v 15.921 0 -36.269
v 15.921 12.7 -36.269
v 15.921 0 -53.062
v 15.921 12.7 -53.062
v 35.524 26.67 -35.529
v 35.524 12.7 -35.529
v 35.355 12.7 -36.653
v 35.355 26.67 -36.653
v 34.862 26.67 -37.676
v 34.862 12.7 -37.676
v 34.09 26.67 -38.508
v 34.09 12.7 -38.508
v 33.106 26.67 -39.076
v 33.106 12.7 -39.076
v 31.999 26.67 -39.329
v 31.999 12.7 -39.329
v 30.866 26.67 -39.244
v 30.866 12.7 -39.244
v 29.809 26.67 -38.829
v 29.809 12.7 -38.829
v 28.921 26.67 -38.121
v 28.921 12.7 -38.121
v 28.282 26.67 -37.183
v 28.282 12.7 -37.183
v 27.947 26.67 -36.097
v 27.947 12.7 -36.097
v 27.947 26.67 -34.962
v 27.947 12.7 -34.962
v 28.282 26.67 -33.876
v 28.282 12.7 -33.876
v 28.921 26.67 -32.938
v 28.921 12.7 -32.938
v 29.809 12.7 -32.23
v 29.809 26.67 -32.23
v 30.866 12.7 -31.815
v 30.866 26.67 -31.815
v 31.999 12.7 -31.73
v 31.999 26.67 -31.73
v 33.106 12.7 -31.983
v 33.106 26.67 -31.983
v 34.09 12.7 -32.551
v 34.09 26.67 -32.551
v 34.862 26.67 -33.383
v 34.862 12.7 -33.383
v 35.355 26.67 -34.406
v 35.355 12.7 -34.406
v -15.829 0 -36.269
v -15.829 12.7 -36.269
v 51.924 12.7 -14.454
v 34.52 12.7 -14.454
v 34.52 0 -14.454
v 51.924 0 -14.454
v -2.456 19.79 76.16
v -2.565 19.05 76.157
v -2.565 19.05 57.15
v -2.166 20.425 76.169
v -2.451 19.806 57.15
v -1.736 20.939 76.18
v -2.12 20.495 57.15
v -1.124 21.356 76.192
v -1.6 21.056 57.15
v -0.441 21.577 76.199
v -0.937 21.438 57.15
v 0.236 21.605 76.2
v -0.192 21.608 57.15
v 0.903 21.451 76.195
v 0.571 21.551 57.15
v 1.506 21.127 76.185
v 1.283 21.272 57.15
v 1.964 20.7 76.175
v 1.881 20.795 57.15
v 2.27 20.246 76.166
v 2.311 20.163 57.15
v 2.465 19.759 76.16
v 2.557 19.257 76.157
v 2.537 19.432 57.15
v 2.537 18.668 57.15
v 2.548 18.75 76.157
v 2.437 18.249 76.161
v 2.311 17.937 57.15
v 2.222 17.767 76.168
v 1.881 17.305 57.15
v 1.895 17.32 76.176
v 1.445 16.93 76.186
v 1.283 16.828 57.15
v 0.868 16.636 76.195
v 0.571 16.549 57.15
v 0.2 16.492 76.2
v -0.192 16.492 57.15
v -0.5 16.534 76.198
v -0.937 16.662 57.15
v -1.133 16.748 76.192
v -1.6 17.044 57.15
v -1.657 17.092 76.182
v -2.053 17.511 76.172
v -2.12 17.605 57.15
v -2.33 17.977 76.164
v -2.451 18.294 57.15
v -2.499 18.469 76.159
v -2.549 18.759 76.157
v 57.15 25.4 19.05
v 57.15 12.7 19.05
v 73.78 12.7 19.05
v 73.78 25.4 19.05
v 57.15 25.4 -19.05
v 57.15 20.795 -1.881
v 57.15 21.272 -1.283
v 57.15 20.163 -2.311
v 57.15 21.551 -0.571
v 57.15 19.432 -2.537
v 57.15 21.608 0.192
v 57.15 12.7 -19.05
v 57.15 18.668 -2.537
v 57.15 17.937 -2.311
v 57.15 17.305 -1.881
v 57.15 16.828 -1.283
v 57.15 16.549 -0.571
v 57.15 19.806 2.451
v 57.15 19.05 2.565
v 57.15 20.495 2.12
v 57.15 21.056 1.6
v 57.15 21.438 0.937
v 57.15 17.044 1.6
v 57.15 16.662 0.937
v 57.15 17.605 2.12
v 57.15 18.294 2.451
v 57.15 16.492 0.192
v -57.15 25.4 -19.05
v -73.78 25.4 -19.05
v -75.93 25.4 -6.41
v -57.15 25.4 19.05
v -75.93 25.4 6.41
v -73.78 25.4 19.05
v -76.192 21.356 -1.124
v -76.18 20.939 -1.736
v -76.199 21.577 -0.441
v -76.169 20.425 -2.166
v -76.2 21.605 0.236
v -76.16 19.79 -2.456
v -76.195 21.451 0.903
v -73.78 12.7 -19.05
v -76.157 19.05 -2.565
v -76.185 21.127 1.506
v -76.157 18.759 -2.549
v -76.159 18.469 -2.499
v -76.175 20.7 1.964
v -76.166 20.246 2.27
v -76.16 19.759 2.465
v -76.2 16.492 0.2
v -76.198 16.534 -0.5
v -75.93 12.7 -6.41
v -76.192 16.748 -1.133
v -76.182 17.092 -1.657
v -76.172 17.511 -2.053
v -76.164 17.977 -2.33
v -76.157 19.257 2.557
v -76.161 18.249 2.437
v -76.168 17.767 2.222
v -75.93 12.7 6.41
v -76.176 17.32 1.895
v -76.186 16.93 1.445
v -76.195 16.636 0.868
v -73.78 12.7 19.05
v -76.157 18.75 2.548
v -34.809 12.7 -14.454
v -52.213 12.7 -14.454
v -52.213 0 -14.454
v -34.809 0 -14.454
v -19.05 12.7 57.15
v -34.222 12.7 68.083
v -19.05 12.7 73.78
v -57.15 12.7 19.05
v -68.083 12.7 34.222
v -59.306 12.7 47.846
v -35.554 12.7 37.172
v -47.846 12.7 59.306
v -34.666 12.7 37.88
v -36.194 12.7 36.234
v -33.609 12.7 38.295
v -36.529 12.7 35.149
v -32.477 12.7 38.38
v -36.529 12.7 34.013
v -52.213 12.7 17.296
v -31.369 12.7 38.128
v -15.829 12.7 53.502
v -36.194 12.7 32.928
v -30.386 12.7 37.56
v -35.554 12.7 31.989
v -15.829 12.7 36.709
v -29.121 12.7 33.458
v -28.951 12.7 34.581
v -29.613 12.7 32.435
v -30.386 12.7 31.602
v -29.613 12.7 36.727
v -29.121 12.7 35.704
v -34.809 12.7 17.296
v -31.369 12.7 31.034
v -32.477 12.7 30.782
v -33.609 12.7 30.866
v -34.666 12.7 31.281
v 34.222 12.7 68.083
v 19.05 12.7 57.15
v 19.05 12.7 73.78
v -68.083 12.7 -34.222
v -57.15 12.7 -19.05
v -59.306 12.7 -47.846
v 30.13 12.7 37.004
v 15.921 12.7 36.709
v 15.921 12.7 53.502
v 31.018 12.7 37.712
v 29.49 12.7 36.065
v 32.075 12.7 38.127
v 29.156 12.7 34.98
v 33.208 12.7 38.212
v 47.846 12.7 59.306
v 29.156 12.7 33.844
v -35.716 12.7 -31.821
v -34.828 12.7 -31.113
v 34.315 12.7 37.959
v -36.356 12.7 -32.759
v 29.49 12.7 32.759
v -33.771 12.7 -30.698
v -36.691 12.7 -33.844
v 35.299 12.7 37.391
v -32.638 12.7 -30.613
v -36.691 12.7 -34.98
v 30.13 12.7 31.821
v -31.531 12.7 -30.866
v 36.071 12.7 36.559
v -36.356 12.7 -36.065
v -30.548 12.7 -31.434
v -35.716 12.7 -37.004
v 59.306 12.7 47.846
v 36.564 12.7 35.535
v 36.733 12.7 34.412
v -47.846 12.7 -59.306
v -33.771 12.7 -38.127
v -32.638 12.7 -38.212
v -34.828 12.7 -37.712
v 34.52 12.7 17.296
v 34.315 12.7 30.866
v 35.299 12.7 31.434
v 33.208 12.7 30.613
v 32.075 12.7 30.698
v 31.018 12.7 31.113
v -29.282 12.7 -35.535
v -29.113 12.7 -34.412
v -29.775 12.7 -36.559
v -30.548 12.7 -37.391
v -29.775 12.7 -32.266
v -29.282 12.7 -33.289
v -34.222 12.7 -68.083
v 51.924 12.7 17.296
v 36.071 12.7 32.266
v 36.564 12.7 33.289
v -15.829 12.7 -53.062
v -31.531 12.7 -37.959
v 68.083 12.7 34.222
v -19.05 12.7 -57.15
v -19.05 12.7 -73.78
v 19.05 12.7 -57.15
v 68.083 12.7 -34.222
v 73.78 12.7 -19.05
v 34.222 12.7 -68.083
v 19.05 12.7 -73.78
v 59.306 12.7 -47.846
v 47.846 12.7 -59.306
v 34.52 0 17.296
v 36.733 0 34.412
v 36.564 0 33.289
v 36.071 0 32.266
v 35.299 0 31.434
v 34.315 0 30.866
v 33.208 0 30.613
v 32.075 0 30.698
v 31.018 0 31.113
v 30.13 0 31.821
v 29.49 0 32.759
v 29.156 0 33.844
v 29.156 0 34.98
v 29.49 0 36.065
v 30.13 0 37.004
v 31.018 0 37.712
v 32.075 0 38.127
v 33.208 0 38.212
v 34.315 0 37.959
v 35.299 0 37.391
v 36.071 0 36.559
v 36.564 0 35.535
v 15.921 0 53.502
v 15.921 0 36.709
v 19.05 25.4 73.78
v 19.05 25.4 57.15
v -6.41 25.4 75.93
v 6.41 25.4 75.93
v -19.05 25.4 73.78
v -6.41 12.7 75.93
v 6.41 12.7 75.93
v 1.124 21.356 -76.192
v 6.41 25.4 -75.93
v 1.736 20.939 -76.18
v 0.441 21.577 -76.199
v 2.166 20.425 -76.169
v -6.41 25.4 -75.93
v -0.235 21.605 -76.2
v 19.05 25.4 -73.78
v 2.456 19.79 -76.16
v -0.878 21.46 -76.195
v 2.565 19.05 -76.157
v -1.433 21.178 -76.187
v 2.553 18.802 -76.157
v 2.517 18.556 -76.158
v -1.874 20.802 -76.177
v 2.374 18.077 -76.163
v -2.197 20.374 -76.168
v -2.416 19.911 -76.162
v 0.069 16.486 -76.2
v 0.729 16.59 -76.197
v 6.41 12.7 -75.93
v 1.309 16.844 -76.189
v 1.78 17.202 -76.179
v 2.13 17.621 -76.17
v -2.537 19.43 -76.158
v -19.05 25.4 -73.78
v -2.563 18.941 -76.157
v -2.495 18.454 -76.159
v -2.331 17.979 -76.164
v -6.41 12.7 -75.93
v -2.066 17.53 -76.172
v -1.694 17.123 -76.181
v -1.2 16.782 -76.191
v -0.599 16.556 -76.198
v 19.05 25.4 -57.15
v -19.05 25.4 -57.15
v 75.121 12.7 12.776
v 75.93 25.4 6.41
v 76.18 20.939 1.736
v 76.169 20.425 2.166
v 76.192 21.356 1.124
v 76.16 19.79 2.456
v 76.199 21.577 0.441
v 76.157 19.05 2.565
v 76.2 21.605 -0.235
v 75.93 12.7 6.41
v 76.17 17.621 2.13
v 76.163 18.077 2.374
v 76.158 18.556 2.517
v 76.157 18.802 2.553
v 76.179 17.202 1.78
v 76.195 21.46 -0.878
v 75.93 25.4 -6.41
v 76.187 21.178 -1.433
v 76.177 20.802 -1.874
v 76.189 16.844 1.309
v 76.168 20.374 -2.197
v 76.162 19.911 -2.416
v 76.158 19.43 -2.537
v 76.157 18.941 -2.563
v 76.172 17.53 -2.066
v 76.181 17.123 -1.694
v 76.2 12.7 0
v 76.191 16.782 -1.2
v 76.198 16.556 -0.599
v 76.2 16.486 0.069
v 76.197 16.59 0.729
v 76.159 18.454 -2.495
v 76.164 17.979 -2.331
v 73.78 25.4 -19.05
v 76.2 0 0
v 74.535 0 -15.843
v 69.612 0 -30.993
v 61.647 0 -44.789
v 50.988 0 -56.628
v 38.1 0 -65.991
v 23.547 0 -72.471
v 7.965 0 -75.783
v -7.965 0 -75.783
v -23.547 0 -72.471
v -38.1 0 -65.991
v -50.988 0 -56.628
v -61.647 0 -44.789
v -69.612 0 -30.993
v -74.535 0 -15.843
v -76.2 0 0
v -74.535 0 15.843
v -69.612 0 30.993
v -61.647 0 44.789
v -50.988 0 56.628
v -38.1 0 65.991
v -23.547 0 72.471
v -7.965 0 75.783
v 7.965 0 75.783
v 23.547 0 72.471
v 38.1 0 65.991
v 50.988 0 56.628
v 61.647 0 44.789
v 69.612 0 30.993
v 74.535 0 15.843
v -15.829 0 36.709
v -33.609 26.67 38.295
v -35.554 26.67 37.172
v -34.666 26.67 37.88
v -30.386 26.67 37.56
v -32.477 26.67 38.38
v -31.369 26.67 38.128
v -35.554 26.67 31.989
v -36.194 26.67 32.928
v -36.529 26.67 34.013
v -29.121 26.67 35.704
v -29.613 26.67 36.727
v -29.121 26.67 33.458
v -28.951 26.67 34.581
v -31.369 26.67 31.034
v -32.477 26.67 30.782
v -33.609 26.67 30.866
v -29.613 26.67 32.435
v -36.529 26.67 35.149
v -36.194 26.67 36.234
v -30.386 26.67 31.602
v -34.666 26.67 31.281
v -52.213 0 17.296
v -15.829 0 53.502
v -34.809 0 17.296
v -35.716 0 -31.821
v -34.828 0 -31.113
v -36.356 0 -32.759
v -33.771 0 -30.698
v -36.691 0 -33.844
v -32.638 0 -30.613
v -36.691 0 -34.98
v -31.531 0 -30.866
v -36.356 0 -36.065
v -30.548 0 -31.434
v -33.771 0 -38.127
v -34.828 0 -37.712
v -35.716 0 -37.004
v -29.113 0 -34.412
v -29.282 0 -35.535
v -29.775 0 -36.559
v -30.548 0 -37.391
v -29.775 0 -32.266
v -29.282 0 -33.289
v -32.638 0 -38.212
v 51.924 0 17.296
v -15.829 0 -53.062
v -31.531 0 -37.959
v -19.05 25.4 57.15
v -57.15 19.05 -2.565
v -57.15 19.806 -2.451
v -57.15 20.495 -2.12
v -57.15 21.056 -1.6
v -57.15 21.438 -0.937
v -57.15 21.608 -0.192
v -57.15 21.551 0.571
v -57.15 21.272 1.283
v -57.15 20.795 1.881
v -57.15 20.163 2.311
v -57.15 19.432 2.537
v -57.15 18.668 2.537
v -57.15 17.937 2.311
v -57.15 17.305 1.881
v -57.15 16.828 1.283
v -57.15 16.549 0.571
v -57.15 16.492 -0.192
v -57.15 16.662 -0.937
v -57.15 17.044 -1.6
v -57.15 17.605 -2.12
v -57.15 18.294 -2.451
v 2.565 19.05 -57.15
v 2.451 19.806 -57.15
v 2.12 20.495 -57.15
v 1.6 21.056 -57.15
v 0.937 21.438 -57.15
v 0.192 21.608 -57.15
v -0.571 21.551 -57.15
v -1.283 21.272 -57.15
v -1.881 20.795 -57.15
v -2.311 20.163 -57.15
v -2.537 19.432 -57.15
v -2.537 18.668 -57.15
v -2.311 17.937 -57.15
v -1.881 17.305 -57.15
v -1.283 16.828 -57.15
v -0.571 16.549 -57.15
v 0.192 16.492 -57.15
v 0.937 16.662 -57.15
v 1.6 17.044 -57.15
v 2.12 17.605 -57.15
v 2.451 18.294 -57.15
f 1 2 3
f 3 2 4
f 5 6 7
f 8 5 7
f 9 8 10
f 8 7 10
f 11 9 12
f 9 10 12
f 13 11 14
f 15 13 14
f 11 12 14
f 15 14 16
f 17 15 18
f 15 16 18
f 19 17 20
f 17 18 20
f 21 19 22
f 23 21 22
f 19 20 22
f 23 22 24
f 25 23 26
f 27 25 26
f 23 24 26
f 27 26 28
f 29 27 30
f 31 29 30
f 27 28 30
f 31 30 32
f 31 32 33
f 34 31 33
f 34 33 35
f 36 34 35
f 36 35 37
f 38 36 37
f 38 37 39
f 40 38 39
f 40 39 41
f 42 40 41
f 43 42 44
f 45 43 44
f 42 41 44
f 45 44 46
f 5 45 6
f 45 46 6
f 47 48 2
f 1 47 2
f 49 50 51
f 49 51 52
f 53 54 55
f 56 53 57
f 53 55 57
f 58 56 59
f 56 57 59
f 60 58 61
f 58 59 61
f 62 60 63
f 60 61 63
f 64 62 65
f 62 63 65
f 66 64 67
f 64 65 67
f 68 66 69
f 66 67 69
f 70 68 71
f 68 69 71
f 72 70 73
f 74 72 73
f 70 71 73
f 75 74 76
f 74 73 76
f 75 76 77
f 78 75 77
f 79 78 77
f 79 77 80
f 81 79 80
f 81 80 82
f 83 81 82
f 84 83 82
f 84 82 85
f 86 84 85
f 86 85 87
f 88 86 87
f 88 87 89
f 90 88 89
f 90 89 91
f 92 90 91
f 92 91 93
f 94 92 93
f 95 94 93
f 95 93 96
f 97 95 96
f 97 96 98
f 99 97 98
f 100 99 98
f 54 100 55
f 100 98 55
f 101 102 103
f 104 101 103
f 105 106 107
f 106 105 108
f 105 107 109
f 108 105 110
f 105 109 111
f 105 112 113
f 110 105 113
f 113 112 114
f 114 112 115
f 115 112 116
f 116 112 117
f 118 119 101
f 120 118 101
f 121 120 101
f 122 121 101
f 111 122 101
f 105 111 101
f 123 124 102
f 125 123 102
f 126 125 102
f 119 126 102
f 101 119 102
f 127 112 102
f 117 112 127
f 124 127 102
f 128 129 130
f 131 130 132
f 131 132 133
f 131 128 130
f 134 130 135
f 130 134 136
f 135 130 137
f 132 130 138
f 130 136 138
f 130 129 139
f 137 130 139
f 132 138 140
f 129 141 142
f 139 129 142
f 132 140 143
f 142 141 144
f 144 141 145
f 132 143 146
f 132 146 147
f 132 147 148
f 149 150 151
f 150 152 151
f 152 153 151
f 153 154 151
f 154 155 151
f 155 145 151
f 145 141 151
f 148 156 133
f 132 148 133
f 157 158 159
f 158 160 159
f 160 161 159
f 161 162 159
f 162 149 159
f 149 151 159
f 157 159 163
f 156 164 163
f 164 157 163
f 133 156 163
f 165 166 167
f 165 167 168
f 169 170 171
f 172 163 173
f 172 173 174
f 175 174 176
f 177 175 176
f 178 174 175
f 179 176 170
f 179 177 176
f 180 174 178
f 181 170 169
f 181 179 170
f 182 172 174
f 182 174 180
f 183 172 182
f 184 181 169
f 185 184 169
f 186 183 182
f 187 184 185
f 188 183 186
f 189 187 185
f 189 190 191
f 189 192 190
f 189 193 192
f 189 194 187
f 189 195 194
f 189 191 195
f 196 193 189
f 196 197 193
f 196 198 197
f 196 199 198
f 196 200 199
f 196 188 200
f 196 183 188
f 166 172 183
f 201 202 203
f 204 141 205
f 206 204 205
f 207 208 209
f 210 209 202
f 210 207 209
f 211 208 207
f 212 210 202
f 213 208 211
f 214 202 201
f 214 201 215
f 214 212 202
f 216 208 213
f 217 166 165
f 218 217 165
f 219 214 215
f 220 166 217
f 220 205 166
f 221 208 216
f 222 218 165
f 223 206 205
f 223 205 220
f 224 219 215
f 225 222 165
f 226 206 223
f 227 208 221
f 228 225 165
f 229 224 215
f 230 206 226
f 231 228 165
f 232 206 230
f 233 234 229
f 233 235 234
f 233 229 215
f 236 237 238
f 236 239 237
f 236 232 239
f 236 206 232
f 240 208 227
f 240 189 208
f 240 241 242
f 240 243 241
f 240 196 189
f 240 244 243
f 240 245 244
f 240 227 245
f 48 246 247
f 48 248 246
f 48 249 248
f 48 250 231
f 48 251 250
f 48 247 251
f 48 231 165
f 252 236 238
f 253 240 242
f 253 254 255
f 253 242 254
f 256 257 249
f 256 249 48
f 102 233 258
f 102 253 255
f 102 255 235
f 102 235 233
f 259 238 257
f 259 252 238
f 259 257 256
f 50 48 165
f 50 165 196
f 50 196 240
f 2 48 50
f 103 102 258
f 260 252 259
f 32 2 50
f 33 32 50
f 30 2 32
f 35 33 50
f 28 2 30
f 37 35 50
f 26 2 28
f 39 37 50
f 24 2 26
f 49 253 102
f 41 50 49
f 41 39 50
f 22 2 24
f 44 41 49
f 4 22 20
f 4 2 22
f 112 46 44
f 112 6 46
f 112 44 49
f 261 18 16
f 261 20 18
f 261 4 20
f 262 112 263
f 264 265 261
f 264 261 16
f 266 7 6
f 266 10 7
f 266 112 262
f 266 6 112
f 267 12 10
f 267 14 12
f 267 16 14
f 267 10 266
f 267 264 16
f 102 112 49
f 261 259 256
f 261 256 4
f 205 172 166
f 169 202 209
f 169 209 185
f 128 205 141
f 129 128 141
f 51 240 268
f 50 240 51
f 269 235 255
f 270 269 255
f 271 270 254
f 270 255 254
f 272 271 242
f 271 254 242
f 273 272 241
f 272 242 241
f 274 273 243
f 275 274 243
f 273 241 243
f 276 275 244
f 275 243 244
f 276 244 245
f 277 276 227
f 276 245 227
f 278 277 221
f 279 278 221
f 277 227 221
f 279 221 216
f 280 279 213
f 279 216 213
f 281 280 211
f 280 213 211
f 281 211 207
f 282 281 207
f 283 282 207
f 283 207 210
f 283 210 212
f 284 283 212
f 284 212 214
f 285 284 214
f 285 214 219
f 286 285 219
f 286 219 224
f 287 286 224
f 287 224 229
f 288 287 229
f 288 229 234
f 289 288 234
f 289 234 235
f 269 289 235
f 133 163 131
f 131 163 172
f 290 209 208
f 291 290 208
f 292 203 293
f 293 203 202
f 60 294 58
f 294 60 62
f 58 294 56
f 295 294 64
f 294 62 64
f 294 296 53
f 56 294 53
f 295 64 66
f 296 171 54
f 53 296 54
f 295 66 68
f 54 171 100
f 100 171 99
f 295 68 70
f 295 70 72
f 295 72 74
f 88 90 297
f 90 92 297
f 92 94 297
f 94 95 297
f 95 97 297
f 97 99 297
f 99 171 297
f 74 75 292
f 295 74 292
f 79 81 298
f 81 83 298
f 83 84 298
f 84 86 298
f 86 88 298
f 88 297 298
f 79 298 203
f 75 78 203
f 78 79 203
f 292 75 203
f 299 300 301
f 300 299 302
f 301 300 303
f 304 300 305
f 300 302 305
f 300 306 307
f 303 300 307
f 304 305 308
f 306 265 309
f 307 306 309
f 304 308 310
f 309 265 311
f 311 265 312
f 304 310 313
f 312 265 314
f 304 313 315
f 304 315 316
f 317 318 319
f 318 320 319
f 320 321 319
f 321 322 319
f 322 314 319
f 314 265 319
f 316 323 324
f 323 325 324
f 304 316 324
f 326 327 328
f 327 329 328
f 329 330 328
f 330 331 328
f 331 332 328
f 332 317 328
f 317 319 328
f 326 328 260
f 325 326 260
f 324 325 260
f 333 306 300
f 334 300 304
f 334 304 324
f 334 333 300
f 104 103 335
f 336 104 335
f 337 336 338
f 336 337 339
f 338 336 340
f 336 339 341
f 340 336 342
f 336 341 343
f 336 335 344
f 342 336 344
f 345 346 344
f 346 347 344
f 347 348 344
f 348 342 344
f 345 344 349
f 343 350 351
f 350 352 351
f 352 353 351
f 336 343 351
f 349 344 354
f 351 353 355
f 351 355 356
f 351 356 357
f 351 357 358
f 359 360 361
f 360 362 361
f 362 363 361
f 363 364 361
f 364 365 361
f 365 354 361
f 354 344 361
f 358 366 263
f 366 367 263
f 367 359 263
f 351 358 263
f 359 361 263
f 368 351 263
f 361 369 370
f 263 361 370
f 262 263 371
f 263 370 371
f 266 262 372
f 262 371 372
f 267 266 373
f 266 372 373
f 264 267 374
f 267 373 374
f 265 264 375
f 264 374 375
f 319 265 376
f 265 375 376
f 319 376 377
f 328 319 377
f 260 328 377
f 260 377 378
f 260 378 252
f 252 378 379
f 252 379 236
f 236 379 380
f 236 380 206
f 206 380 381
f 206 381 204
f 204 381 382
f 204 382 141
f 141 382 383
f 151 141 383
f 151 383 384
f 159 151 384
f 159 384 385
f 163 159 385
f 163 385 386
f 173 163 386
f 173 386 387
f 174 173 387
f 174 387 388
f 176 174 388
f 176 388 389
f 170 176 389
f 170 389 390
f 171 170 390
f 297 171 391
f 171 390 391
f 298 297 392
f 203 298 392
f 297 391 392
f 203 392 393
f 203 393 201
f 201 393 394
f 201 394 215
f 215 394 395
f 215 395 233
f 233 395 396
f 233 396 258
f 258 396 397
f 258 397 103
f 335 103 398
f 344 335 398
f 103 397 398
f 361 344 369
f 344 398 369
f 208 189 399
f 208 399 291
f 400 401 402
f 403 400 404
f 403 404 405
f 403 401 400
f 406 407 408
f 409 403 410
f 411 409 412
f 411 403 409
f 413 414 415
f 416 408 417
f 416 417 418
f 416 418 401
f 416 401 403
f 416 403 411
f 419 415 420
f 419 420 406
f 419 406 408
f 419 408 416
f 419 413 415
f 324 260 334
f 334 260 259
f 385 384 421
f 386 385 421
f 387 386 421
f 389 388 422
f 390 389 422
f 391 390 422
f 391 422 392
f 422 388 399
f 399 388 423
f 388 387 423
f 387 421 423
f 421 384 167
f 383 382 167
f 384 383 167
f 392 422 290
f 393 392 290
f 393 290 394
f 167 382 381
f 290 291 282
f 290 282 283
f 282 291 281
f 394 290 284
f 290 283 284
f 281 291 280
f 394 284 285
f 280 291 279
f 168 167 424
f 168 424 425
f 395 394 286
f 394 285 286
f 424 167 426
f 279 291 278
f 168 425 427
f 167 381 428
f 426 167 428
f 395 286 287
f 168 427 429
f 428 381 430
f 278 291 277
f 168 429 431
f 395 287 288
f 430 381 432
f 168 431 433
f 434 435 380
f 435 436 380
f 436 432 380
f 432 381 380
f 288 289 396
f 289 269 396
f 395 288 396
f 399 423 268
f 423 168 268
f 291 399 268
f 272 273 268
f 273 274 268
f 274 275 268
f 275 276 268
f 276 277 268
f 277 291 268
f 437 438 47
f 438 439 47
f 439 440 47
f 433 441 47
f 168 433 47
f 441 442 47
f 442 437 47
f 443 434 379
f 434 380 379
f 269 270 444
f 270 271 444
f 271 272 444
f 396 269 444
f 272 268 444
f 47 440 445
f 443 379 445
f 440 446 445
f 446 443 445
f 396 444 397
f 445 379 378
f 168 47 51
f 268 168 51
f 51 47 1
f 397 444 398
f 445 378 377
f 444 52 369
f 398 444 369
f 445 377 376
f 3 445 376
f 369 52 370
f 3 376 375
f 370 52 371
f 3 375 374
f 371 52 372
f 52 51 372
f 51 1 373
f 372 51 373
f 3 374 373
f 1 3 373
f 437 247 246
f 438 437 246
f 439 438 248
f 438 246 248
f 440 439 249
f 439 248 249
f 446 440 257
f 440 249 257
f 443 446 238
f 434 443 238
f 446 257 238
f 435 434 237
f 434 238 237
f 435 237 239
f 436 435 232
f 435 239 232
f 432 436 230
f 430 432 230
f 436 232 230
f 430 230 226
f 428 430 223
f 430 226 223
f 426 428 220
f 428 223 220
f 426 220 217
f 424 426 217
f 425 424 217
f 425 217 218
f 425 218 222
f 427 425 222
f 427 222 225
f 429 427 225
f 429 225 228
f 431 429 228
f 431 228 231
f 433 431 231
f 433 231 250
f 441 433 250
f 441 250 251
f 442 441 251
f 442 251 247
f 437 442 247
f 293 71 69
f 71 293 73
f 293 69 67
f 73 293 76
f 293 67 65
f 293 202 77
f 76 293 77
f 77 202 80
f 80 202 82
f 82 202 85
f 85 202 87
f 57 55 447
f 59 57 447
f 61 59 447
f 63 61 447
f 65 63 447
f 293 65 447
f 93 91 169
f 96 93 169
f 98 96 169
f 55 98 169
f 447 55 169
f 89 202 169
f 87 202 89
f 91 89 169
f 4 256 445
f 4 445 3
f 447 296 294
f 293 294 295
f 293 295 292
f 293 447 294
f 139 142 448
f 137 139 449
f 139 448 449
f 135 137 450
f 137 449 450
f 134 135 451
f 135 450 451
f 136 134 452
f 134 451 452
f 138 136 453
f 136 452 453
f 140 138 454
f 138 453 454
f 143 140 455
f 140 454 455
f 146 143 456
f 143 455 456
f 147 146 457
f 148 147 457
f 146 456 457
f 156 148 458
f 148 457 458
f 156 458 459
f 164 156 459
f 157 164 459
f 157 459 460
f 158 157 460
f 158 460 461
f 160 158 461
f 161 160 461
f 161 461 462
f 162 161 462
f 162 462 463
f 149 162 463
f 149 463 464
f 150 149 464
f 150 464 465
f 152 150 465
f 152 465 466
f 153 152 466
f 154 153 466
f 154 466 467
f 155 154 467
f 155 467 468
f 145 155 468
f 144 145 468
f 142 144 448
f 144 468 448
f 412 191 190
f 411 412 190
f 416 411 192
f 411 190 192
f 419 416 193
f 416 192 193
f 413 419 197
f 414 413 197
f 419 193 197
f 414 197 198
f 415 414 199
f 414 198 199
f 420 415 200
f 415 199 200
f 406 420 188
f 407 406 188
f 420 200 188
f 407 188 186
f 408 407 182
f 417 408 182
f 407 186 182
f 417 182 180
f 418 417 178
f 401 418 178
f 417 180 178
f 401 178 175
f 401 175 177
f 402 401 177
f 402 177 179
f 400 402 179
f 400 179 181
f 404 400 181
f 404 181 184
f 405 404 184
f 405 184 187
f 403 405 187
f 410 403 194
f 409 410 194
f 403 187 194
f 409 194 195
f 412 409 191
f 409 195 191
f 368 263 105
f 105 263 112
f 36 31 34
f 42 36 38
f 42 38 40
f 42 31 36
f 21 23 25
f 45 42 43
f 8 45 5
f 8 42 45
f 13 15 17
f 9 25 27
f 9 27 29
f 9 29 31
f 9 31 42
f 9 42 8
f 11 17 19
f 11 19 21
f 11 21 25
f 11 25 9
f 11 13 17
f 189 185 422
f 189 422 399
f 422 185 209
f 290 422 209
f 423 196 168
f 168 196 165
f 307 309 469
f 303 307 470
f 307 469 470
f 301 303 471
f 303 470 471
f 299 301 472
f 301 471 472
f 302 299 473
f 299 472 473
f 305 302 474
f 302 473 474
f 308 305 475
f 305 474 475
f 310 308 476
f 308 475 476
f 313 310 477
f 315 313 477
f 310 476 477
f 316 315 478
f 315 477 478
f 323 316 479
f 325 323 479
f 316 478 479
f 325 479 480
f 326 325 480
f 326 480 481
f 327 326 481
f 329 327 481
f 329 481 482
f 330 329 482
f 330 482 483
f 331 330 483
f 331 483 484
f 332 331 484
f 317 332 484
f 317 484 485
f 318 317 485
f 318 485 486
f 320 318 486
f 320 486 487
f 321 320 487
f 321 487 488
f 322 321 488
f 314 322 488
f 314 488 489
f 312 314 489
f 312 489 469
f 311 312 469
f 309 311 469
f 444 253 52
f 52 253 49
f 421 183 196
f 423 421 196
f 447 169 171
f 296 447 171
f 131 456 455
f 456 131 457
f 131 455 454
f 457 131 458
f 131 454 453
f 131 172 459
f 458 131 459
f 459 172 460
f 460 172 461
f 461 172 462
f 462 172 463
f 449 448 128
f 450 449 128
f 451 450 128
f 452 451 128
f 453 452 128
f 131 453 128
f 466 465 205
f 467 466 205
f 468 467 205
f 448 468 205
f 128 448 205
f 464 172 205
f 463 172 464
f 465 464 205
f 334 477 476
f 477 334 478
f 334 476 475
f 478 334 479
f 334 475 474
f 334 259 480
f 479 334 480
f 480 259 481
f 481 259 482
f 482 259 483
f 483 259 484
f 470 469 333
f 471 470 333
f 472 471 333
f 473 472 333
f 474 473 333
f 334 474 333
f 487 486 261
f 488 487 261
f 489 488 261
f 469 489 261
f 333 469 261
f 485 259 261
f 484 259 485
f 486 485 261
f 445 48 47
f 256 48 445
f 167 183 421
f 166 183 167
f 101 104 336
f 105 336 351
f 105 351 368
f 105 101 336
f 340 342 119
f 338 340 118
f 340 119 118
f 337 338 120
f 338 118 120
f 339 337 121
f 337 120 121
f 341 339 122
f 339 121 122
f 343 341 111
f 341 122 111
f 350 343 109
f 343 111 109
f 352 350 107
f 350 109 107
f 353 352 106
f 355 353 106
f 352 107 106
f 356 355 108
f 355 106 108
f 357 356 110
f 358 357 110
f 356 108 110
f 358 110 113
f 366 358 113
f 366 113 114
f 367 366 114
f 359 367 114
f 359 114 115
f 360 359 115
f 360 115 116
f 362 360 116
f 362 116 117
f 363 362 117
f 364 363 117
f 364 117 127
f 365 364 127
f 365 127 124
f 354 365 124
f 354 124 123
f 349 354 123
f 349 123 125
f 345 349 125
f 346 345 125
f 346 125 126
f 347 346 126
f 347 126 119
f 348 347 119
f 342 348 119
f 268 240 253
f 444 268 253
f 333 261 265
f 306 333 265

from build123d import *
from build123d.topology import SkipClean

# Parameters (mm, degrees)
SKETCH1_R           = 76.2
BOSS_EXTRUDE1_DEPTH = 12.7
SKETCH9_W           = 17.40446846
SKETCH9_H           = 31.75
SKETCH9_W_2         = 17.404468459
SKETCH9_W_3         = 31.75
SKETCH9_H_2         = 16.793136505
CUT_EXTRUDE1_DEPTH  = 12.7
SKETCH12_R          = 3.81
CUT_EXTRUDE7_DEPTH  = 109.508847566
SKETCH14_R          = 3.81
BOSS_EXTRUDE5_DEPTH = 13.97
BOSS_EXTRUDE6_DEPTH = 12.7
SKETCH15_R          = 2.5654
CUT_EXTRUDE8_DEPTH  = 156.884416797
CIRPATTERN1_COUNT   = 4


with BuildPart() as part:
    # Sketch1 → Boss-Extrude1 (new body)
    with BuildSketch(Plane(origin=(0, 0, 0), x_dir=(1, 0, 0), z_dir=(0, 1, 0))):
        Circle(SKETCH1_R)
    extrude(amount=BOSS_EXTRUDE1_DEPTH)

    # Sketch9 → Cut-Extrude1 (cut)
    with BuildSketch(Plane(origin=(0, 12.7, 0), x_dir=(1, 0, 0), z_dir=(0, 1, 0))):
        with Locations((43.222256972, -1.420690531)):
            Rectangle(SKETCH9_W, SKETCH9_H)
        with Locations((-43.511171149, -1.420690531)):
            Rectangle(SKETCH9_W_2, SKETCH9_H)
        with Locations((0.046278064, 44.665088999)):
            Rectangle(SKETCH9_W_3, SKETCH9_H_2)
        with Locations((0.046278064, -45.105910611)):
            Rectangle(SKETCH9_W_3, SKETCH9_H_2)
    extrude(amount=-CUT_EXTRUDE1_DEPTH, mode=Mode.SUBTRACT)

    # Sketch12 → Cut-Extrude7 (cut, through all)
    with BuildSketch(Plane(origin=(0, 12.7, 0), x_dir=(1, 0, 0), z_dir=(0, 1, 0))):
        with Locations((-32.923159658, 34.412296975)):
            Circle(SKETCH12_R)
        with Locations((32.923159658, -34.412296975)):
            Circle(SKETCH12_R)
    extrude(amount=-CUT_EXTRUDE7_DEPTH, mode=Mode.SUBTRACT)

    # Sketch14 → Boss-Extrude5 (add)
    with BuildSketch(Plane(origin=(0, 12.7, 0), x_dir=(1, 0, 0), z_dir=(0, 1, 0))):
        with Locations((31.714292366, 35.529484723)):
            Circle(SKETCH14_R)
        with Locations((-32.761256964, -34.580899947)):
            Circle(SKETCH14_R)
    extrude(amount=BOSS_EXTRUDE5_DEPTH)

    # Sketch2 → Boss-Extrude6 (add)
    with BuildSketch(Plane(origin=(0, 12.7, 0), x_dir=(1, 0, 0), z_dir=(0, 1, 0))):
        with BuildLine():
            Line((-19.05, -73.780332745), (-19.05, -57.15))
            Line((-19.05, -57.15), (19.05, -57.15))
            Line((19.05, -57.15), (19.05, -73.780332745))
            ThreePointArc((19.05, -73.780332745), (0, -76.2), (-19.05, -73.780332745))
        make_face()
    boss_extrude6 = extrude(amount=BOSS_EXTRUDE6_DEPTH)

    # Sketch15 → Cut-Extrude8 (cut, through all)
    with BuildSketch(Plane(origin=(0, 0, 57.15), x_dir=(-1, 0, 0), z_dir=(0, 0, -1))):
        with Locations((0, 19.05)):
            Circle(SKETCH15_R)
    cut_extrude8 = extrude(amount=-CUT_EXTRUDE8_DEPTH, mode=Mode.SUBTRACT)

    # CirPattern1: Boss-Extrude6, Cut-Extrude8 ×4 about axis
    with SkipClean():  # the faces are left unmerged after this step: merging them gives an invalid solid
        cirpattern1_axis = Axis((0, 28.0035, 0), (0, -1, 0))
        add([boss_extrude6.rotate(cirpattern1_axis, i * 360 / CIRPATTERN1_COUNT) for i in range(1, CIRPATTERN1_COUNT)])
        add([cut_extrude8.rotate(cirpattern1_axis, i * 360 / CIRPATTERN1_COUNT) for i in range(1, CIRPATTERN1_COUNT)], mode=Mode.SUBTRACT)


solid = part.part
